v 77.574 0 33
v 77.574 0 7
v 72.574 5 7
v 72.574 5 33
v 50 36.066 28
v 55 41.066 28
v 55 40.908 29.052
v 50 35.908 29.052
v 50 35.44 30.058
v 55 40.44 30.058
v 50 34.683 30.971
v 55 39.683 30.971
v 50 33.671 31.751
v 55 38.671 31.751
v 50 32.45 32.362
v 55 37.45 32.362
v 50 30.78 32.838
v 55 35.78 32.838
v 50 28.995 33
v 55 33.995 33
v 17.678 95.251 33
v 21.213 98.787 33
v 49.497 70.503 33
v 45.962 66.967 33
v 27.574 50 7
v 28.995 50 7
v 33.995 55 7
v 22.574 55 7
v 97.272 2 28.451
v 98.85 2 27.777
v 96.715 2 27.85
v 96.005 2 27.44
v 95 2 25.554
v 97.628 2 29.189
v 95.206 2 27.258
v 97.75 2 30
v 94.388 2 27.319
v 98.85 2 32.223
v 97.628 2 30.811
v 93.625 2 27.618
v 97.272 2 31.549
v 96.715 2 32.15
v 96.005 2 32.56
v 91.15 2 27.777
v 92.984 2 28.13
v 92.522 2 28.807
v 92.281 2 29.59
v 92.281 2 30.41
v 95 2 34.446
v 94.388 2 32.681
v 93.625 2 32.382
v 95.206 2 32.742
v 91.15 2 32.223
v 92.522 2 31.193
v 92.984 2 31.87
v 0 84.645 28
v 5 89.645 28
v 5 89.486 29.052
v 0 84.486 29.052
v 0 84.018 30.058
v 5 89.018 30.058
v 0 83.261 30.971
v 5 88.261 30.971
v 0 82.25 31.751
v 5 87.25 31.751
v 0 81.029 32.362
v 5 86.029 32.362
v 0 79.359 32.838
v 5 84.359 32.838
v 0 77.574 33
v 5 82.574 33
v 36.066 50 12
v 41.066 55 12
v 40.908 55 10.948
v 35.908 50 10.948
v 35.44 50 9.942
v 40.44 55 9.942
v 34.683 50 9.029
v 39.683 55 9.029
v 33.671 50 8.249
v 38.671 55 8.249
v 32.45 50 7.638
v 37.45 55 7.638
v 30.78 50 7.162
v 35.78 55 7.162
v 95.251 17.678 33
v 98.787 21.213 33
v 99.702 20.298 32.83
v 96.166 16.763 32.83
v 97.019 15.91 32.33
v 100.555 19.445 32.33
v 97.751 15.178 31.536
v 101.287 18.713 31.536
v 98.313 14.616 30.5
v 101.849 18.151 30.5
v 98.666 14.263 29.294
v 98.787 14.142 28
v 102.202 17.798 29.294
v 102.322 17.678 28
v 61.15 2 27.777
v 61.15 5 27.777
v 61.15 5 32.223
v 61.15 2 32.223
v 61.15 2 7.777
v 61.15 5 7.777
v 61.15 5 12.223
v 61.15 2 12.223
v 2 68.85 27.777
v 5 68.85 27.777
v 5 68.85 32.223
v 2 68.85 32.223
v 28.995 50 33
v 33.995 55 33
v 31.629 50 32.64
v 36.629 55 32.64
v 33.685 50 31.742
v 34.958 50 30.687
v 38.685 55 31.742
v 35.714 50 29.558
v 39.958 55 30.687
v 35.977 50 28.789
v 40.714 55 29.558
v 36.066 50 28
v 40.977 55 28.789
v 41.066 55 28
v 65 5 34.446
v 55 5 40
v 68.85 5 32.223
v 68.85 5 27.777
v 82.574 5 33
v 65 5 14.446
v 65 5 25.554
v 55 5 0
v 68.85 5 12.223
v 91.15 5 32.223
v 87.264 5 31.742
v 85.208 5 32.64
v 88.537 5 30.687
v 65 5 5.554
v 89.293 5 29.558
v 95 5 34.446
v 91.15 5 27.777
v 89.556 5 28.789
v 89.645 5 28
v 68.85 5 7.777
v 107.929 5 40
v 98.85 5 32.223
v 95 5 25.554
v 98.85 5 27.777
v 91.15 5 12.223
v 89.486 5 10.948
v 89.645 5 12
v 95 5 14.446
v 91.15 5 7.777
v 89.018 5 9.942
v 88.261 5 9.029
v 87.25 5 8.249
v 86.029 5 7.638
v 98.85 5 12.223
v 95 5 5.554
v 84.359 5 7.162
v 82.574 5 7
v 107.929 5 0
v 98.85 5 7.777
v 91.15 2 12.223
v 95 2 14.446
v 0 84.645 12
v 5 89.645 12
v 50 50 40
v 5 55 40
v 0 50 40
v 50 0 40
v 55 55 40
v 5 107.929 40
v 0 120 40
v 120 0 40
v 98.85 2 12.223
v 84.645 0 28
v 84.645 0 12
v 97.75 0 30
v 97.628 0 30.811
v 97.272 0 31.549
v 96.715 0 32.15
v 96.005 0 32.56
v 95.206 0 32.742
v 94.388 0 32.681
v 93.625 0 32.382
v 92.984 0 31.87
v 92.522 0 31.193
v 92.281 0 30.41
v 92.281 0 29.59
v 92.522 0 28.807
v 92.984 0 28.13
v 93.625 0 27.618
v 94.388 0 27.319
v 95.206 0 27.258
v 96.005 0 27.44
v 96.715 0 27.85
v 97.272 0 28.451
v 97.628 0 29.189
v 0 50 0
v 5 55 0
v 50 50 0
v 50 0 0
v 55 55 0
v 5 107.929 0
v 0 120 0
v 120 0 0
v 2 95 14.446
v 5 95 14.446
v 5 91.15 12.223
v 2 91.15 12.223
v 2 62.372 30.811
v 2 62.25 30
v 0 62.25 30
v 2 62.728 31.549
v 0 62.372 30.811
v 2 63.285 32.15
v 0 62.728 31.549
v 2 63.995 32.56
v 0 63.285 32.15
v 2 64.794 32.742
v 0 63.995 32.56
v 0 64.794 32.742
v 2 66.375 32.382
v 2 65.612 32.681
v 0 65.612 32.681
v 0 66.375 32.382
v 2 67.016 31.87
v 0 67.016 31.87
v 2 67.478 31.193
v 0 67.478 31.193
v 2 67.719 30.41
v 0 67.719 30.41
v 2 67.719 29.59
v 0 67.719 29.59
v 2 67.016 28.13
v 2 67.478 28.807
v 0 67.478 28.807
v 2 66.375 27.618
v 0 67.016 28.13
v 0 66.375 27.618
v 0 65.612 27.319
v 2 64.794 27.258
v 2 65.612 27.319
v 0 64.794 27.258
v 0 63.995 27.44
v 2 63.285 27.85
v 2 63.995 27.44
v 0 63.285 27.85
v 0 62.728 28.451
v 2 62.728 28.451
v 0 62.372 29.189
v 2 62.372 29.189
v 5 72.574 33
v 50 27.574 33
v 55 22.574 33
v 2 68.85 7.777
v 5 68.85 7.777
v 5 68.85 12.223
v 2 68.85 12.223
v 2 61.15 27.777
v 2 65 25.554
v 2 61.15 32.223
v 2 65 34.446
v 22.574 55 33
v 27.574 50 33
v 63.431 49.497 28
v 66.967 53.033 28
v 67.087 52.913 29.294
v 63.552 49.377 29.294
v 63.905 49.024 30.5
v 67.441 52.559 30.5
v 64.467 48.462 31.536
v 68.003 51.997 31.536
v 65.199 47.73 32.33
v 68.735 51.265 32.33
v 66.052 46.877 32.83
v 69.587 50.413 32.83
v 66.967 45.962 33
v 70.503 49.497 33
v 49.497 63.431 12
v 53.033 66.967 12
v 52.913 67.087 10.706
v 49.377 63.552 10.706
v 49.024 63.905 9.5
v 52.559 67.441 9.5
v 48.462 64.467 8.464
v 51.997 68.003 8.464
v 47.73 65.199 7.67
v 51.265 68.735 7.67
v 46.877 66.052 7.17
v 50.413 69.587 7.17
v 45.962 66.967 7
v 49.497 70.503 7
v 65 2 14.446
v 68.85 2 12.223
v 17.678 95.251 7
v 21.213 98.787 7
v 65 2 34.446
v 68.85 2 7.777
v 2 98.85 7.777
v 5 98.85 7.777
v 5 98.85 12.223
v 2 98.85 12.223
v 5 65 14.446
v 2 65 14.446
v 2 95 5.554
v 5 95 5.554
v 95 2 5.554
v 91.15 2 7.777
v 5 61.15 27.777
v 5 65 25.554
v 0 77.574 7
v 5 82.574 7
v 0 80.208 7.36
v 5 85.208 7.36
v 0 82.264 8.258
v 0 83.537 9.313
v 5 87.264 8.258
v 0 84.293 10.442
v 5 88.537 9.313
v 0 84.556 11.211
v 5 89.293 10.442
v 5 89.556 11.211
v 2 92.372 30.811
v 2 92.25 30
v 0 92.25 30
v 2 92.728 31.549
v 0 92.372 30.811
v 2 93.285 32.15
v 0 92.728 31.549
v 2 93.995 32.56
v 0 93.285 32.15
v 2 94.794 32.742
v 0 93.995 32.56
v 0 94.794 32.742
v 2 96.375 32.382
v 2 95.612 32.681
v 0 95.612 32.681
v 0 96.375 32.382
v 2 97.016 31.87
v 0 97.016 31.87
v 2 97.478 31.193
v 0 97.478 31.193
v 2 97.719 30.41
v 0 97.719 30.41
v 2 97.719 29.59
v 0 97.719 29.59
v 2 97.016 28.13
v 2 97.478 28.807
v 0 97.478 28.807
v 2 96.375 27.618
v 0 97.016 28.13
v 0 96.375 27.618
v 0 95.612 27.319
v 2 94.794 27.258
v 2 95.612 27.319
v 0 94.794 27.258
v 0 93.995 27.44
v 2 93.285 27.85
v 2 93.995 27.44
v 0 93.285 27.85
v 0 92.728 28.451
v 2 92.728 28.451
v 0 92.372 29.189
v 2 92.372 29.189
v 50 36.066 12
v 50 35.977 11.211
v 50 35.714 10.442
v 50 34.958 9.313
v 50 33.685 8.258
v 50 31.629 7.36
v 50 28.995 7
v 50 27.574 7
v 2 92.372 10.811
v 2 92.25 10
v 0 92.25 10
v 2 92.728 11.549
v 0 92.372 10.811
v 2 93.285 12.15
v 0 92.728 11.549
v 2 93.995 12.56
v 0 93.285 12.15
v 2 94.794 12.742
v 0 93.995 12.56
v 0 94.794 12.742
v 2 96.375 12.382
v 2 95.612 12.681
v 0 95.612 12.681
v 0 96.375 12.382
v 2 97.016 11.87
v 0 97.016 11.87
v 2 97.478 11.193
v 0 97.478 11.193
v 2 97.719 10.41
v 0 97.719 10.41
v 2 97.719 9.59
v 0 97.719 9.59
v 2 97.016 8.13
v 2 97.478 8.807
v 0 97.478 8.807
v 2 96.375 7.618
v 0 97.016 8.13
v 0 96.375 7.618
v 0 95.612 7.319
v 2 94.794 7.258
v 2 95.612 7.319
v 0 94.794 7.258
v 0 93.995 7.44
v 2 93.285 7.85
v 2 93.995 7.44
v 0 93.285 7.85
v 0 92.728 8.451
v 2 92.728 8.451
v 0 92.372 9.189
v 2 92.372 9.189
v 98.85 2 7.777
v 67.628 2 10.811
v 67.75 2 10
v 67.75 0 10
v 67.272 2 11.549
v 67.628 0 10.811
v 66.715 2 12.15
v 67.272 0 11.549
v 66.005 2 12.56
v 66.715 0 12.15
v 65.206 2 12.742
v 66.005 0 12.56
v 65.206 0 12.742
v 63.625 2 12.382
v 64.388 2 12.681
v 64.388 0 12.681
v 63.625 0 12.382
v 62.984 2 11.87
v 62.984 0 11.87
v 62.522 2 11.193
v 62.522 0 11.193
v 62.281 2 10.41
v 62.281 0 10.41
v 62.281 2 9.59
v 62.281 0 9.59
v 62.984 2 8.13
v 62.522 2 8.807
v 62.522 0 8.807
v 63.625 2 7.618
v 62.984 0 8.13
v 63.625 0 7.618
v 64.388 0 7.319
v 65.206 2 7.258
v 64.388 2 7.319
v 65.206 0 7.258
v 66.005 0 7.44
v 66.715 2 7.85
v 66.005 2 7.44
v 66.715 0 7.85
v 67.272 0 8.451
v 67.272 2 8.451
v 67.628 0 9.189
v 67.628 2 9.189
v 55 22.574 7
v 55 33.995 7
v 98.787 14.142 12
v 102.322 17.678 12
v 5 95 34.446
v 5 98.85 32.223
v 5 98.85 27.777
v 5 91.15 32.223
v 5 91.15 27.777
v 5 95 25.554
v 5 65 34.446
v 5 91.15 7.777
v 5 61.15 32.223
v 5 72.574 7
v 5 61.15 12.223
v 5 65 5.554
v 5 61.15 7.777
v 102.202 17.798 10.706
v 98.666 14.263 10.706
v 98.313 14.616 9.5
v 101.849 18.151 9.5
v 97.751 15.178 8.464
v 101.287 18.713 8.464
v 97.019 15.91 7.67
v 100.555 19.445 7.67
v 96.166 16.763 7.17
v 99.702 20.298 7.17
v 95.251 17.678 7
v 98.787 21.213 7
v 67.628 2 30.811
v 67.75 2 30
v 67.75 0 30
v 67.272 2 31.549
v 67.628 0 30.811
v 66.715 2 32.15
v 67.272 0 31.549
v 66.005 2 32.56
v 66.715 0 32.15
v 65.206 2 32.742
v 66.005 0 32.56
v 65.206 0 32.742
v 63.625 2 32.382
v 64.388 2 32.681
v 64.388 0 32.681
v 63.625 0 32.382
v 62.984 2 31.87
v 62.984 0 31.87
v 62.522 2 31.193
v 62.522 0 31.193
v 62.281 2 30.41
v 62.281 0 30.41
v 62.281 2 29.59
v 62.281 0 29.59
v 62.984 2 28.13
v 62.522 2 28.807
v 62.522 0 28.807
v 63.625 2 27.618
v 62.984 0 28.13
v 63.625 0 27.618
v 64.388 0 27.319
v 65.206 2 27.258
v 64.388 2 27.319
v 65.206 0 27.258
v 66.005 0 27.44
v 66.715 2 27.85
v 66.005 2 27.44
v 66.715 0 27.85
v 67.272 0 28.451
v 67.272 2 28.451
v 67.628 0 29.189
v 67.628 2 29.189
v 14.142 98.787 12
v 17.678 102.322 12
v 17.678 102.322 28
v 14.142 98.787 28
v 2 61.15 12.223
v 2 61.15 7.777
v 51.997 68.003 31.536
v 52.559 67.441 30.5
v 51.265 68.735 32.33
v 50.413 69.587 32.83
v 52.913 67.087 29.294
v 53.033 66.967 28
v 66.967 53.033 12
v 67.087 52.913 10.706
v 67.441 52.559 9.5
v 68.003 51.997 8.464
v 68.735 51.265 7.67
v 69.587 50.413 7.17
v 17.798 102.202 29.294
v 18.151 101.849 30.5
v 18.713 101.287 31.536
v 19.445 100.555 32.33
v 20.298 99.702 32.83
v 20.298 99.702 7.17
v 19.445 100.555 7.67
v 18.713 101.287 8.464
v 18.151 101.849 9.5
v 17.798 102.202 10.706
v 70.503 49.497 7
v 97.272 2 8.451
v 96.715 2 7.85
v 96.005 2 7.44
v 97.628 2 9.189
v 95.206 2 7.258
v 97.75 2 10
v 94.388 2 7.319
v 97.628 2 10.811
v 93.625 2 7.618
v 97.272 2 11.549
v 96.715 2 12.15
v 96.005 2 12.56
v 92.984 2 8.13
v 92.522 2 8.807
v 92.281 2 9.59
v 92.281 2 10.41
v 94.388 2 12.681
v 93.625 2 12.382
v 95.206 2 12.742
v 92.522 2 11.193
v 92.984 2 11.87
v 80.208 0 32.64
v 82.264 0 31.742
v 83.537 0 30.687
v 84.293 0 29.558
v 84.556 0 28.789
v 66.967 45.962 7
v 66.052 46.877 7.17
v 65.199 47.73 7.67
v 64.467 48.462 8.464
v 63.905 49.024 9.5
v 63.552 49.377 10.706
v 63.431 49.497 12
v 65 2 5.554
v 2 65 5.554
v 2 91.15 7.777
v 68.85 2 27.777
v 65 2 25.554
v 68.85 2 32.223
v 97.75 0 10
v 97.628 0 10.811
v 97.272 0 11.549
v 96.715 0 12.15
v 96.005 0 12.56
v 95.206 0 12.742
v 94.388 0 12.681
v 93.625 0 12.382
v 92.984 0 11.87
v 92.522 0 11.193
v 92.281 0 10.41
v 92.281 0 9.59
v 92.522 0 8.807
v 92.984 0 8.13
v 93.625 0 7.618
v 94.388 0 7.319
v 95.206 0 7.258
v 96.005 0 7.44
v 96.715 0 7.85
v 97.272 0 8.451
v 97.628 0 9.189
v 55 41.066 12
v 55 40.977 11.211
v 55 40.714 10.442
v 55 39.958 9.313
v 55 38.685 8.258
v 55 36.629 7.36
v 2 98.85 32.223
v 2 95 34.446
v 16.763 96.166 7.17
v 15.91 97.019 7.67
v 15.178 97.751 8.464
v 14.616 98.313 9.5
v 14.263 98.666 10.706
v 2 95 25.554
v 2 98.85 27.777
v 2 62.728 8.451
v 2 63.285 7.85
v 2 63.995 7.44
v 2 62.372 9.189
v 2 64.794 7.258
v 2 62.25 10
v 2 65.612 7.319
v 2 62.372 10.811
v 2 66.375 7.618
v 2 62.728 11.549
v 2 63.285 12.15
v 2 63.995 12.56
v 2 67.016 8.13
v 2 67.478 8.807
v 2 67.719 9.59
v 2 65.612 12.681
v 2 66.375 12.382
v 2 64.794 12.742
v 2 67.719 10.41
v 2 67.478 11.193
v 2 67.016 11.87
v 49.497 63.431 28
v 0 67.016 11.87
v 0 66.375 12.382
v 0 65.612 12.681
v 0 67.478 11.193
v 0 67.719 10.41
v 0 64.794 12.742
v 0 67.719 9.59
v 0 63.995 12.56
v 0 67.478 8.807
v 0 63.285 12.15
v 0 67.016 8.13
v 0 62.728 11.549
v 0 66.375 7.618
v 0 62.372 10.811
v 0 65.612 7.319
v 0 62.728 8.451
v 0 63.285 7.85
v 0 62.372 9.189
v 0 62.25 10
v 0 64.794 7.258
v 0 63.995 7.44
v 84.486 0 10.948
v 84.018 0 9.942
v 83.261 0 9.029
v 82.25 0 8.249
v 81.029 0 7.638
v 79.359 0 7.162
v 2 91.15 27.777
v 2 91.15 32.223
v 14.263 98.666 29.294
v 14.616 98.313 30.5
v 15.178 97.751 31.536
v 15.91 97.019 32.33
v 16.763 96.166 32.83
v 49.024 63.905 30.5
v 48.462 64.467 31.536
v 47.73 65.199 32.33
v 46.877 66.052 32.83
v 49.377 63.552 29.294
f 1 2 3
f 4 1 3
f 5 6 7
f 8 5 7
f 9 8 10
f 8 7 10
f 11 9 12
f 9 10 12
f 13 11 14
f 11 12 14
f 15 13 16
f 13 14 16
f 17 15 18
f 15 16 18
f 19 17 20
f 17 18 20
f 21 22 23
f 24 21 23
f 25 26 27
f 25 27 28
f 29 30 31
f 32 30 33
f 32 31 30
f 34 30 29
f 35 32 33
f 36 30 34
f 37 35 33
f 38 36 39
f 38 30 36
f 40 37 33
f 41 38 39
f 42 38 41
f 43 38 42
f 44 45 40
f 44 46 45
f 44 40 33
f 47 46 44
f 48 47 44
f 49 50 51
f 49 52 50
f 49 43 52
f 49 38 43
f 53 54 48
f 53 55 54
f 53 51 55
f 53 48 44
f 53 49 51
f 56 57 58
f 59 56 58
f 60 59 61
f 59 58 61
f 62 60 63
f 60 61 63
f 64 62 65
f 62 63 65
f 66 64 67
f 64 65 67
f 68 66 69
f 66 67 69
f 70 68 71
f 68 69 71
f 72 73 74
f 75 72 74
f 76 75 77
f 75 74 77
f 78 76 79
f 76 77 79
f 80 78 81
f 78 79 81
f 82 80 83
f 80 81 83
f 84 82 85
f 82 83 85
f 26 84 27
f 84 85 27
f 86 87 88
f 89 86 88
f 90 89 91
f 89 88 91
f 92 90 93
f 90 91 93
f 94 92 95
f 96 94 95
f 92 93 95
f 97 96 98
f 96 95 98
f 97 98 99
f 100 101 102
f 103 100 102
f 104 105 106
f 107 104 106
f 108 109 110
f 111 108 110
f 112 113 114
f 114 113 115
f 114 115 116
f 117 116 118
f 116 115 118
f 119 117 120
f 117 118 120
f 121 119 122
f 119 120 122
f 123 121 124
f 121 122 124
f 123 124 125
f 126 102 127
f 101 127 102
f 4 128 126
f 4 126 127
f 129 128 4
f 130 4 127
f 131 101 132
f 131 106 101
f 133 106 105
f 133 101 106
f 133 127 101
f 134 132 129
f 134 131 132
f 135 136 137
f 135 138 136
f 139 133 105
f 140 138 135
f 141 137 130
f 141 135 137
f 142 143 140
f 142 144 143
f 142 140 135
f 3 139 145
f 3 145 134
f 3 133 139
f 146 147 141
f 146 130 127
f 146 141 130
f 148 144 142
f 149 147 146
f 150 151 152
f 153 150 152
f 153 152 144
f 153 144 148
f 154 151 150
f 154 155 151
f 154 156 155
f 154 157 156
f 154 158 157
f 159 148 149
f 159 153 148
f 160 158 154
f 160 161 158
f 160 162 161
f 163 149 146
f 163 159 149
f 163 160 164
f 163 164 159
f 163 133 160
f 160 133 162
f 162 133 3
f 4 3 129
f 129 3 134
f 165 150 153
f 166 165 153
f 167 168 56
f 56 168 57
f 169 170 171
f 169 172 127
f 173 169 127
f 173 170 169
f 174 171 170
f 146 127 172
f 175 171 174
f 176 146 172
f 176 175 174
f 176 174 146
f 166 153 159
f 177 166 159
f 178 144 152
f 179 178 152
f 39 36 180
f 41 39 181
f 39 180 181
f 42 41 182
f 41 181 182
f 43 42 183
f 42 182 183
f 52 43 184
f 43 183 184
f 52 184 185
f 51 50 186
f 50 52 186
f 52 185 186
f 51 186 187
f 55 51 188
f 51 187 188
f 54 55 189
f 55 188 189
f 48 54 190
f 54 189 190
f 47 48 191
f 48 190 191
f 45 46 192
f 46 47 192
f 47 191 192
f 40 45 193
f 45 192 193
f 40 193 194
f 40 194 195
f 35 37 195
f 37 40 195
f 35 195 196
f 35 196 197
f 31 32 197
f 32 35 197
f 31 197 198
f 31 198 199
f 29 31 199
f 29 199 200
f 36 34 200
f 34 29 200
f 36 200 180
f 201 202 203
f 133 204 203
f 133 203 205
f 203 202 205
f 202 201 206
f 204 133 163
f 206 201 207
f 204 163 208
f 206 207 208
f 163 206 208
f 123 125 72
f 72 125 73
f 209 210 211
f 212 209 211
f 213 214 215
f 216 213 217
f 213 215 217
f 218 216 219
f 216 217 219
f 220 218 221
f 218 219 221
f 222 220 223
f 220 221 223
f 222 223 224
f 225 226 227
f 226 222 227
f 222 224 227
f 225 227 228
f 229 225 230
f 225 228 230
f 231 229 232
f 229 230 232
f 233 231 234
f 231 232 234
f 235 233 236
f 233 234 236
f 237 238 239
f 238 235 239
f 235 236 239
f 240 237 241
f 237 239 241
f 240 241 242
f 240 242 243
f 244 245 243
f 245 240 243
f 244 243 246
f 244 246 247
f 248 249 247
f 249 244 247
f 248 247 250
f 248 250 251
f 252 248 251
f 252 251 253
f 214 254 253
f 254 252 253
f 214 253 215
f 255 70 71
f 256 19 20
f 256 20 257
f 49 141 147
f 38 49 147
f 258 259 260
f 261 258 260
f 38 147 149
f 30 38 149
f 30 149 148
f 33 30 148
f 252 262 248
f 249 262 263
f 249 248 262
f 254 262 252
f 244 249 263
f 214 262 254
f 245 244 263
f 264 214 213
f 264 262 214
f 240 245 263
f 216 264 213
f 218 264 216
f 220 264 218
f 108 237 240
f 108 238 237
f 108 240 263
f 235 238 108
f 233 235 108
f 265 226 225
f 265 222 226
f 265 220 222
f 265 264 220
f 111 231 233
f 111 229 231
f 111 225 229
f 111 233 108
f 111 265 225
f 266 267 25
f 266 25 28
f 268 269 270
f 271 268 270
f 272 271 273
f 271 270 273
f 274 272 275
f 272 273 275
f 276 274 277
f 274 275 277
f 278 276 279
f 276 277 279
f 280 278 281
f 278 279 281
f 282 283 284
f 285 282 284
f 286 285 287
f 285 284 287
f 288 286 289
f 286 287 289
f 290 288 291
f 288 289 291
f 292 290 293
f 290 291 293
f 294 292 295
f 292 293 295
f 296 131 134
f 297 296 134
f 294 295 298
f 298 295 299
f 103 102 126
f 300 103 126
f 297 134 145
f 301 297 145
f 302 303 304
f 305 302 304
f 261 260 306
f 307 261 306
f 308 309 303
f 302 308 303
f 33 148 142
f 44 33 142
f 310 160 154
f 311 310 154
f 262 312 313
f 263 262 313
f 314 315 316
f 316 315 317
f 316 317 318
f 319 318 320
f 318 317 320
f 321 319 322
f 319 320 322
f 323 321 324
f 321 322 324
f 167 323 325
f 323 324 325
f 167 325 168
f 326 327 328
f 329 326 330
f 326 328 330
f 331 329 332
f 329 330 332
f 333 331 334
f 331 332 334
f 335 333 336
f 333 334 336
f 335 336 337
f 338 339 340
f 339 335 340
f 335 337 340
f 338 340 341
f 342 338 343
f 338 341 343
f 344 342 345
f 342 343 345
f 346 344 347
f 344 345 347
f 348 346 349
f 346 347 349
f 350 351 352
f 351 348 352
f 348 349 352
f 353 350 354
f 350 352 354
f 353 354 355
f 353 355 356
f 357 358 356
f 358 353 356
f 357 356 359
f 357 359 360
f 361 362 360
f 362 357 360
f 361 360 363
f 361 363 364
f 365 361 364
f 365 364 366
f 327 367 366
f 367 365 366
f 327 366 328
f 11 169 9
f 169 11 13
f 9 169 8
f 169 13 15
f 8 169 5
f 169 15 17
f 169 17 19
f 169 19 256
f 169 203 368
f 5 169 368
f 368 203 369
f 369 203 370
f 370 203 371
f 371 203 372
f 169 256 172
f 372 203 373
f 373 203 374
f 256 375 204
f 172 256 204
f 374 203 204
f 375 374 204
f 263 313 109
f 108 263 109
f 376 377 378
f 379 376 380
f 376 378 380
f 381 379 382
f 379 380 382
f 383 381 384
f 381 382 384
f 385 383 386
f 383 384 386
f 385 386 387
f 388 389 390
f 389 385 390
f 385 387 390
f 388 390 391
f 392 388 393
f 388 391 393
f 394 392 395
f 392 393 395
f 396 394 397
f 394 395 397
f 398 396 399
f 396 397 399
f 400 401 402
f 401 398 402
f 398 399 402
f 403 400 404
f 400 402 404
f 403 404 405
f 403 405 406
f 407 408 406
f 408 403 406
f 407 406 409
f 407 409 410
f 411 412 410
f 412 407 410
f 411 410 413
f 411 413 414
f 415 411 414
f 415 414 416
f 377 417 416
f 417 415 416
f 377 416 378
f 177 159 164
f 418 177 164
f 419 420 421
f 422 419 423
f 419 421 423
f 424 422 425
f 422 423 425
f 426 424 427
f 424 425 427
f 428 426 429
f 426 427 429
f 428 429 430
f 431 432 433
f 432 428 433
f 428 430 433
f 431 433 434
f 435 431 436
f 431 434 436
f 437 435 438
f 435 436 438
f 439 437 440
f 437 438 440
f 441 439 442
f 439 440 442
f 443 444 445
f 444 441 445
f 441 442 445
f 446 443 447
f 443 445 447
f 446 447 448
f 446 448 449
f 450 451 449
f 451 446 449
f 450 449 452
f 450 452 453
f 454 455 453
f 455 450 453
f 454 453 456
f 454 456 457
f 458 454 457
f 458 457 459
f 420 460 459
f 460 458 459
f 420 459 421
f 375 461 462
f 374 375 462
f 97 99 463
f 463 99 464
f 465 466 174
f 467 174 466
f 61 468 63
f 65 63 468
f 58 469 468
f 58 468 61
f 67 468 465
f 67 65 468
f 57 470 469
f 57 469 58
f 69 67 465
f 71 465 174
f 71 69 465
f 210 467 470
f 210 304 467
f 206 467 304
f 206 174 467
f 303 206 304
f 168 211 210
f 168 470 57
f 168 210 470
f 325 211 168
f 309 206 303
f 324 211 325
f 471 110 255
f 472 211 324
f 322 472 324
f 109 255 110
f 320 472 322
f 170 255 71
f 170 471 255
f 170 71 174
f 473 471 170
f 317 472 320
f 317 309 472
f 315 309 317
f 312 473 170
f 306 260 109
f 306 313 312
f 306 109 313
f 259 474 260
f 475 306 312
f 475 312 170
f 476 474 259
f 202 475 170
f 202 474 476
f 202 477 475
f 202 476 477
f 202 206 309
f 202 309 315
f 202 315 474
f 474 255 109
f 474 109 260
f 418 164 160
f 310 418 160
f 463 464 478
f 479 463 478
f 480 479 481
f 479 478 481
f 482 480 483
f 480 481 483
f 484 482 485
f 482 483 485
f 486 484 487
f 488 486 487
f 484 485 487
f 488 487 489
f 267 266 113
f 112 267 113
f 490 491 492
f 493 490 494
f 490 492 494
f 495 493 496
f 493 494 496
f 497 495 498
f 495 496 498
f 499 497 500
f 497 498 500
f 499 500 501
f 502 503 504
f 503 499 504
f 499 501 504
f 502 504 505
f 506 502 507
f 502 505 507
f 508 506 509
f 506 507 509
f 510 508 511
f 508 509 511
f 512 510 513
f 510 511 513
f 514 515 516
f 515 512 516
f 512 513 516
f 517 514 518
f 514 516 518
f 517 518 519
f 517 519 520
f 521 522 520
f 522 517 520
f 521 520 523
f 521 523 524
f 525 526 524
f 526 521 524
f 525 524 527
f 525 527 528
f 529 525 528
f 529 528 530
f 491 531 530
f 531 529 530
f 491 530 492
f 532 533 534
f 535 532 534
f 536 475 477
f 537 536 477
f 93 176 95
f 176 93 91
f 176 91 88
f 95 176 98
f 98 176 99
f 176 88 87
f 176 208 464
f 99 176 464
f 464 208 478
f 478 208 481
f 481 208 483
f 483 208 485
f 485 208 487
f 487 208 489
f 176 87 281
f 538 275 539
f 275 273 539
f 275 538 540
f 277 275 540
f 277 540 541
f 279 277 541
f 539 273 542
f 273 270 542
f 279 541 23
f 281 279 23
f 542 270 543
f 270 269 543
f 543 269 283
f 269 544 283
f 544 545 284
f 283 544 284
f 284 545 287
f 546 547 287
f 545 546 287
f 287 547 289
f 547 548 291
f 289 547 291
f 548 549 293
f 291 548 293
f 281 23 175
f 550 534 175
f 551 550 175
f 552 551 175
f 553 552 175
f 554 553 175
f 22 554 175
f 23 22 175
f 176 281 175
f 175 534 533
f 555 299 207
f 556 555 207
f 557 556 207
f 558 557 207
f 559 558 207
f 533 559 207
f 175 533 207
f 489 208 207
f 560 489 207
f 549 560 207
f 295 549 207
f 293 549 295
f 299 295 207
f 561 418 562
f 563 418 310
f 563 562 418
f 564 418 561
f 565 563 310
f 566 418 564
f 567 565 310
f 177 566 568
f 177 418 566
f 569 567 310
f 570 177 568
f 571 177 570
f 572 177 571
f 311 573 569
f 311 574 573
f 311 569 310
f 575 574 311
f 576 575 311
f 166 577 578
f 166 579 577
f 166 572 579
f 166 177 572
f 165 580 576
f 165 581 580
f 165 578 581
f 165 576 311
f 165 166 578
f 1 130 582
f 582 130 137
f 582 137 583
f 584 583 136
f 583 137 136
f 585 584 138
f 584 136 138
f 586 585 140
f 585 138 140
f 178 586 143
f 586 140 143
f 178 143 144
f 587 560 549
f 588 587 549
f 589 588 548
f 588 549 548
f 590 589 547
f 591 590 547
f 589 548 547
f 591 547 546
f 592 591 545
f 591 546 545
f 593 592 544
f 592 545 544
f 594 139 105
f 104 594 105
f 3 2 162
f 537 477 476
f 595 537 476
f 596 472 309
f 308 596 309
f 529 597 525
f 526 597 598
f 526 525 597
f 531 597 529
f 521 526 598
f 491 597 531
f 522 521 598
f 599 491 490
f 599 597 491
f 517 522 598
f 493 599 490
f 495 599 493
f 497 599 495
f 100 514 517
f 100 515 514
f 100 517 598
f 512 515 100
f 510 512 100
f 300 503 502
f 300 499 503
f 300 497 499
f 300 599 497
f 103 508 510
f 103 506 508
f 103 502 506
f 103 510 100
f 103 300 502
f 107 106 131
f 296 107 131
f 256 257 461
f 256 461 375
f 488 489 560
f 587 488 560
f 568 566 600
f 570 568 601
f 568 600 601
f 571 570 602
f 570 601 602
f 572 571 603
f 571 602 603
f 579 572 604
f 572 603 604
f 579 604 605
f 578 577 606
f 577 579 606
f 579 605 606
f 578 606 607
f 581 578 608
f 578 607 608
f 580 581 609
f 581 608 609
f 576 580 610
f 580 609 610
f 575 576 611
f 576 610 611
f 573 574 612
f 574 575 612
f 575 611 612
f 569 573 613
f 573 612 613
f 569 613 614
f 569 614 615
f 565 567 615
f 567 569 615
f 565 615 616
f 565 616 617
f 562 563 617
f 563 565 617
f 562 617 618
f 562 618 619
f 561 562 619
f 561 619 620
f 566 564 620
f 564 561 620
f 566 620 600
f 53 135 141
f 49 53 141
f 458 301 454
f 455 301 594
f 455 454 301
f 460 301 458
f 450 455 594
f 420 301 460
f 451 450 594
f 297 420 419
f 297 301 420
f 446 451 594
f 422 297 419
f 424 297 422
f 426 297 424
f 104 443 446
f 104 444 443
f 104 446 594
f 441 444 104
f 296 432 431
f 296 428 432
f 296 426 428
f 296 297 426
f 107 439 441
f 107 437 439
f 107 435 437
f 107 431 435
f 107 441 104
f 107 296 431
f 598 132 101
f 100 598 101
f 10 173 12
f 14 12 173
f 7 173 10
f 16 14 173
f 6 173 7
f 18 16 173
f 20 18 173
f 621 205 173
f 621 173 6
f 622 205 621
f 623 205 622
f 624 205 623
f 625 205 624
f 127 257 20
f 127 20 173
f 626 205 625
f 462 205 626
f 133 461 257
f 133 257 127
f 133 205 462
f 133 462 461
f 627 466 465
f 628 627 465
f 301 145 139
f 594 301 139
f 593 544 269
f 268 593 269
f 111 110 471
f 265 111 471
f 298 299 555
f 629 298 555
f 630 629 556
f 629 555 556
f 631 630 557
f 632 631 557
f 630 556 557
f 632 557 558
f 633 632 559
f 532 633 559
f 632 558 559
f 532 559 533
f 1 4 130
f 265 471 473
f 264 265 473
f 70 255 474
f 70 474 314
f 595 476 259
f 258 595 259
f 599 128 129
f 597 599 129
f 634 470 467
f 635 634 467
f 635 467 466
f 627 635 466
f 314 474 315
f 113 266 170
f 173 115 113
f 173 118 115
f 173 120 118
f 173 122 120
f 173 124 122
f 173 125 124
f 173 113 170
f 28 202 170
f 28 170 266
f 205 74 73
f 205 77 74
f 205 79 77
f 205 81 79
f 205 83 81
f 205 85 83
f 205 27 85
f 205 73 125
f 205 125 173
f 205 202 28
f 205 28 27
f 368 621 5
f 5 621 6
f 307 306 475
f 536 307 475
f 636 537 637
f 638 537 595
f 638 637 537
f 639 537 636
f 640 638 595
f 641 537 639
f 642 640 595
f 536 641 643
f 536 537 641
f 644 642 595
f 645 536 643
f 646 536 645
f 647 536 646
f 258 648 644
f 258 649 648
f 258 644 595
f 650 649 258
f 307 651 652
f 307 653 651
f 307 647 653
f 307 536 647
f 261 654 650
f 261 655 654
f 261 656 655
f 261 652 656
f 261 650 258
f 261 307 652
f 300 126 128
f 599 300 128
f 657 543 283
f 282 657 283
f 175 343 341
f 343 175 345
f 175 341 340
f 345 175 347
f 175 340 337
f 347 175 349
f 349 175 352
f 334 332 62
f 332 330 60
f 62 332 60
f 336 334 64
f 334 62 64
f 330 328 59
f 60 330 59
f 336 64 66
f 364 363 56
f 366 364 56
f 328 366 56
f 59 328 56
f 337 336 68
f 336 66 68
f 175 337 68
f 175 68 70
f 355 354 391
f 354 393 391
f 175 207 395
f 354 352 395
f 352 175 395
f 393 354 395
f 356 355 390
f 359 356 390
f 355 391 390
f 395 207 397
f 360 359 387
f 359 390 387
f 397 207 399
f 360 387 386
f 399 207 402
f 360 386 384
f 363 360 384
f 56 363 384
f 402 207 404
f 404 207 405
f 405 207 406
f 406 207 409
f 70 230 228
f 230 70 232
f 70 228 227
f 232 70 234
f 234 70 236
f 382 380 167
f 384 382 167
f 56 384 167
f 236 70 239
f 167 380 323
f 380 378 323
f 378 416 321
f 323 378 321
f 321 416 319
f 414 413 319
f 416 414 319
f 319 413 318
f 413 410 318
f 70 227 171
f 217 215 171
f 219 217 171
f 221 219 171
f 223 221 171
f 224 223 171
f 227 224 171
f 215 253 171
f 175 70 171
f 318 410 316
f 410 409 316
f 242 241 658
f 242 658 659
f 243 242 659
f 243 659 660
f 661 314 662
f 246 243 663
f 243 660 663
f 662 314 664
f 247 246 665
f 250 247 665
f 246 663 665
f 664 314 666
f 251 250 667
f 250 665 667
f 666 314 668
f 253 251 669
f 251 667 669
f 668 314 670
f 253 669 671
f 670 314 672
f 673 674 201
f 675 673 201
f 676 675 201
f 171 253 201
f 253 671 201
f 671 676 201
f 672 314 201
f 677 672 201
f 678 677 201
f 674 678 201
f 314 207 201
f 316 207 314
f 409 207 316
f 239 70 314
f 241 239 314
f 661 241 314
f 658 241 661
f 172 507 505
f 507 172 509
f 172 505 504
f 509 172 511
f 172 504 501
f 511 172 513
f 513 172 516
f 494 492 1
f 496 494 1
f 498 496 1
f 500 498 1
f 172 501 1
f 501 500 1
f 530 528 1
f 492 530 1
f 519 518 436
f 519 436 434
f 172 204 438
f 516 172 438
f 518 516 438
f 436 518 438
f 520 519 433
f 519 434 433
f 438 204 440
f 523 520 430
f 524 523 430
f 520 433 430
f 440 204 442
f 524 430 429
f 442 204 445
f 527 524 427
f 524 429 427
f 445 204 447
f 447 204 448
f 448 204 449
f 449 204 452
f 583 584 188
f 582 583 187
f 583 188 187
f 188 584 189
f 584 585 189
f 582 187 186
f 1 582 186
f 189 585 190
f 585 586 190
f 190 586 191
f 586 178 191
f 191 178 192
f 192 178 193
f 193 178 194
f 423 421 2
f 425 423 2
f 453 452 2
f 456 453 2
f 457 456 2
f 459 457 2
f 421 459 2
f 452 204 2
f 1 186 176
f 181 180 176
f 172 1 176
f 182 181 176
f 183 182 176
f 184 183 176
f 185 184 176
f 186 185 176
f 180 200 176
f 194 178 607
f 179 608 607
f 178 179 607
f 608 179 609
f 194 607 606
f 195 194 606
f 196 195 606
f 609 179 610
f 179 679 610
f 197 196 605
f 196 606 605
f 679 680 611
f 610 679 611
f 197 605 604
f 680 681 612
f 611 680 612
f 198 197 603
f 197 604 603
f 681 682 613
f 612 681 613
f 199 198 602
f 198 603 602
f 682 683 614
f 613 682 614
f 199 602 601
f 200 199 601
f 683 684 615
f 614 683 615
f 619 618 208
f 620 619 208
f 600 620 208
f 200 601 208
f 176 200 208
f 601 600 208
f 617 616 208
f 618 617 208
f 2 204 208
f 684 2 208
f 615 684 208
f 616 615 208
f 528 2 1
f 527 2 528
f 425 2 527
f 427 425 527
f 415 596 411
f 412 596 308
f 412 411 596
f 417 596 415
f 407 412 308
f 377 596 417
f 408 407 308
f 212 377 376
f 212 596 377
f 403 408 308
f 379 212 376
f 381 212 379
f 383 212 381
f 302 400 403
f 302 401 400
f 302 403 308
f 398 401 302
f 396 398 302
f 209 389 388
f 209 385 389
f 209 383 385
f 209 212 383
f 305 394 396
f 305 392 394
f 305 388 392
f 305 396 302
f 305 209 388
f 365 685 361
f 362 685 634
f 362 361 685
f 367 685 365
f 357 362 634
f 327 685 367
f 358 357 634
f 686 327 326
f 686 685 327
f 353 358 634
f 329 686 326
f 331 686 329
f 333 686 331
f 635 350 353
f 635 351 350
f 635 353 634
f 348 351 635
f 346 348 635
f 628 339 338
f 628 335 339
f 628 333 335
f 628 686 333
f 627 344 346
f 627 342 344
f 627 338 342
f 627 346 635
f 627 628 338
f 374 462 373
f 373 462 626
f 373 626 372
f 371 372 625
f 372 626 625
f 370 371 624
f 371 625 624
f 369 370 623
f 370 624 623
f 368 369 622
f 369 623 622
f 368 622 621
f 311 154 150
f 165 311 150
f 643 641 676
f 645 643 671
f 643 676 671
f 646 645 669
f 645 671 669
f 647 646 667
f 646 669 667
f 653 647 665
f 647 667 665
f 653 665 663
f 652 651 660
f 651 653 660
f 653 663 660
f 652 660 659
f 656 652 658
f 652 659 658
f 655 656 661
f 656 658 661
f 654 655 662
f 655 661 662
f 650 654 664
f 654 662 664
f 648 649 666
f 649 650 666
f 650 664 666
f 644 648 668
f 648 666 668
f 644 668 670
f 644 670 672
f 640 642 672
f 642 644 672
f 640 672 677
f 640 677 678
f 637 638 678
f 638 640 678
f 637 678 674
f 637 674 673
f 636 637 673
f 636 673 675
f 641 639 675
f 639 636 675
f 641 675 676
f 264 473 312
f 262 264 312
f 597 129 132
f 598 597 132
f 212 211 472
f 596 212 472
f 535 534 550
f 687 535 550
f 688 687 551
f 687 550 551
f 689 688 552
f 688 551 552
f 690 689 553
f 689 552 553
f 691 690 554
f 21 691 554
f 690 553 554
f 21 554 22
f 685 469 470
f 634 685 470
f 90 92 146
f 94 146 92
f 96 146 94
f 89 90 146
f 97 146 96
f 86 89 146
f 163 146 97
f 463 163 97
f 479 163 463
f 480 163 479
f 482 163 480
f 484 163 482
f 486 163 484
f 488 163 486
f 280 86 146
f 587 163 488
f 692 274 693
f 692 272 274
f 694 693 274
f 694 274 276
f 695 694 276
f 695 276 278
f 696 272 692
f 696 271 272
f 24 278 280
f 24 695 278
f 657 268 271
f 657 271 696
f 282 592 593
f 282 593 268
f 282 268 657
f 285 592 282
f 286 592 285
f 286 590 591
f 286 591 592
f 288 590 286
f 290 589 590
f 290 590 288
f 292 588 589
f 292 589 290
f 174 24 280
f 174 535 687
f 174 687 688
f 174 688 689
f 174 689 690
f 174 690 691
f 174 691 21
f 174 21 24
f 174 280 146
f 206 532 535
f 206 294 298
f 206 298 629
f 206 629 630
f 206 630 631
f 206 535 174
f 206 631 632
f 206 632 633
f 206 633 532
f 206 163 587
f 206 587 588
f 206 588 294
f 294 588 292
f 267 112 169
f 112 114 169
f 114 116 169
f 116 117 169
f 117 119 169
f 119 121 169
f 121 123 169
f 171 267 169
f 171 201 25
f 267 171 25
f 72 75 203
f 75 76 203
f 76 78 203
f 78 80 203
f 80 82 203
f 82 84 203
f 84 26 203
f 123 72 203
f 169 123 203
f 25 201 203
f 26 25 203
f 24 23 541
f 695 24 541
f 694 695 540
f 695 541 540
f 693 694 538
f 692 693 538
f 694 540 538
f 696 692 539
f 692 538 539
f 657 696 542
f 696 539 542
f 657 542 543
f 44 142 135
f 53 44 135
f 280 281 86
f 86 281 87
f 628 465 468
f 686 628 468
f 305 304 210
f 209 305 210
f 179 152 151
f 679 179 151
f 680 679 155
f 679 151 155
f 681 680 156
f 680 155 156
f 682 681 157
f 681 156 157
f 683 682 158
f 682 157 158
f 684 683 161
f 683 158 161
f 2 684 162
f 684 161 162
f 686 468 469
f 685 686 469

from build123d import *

# Parameters (mm, degrees)
F1_DEPTH  = 40
F2_T      = -5
F4_DEPTH  = 30
F5_R      = 2.75
F6_DEPTH  = 5
F7_R      = 2.75
F8_DEPTH  = 5
F9_R      = 2.75
F10_DEPTH = 3
F11_R     = 2.75
F12_DEPTH = 3


# Not quite as in the source:
# - a feature names something its author has since deleted; it is built from what else it names


with BuildPart() as f1:
    # F0 (on Top) → F1 (new body)
    with BuildSketch(Plane.XY):
        Polygon((120, 0), (0, 120), (0, 100), (50, 50), (100, 0), align=None)
        Polygon((50, 50), (0, 100), (0, 92.9289321881), (42.9289321881, 50), align=None)
        Polygon((42.9289321881, 50), (0, 92.9289321881), (0, 50), align=None)
        Polygon((92.9289321881, 0), (50, 42.9289321881), (50, 0), align=None)
        Polygon((100, 0), (50, 50), (50, 42.9289321881), (92.9289321881, 0), align=None)
    extrude(amount=F1_DEPTH)

    # F2
    f2_openings = [f1.faces().sort_by_distance(p)[0] for p in [
        (51.697056, 25, 40),
        (51.697056, 25, 0),
    ]]
    offset(amount=F2_T, openings=f2_openings, kind=Kind.INTERSECTION)

    # F3 (on face) → F4 (cut)
    with BuildSketch(Plane(origin=(60, 60, 0), x_dir=(-0.7071067812, 0.7071067812, 0), z_dir=(0.7071067812, 0.7071067812, 0))):
        with BuildLine():
            ThreePointArc((59.8528137424, 28), (58.3883476483, 31.5355339059), (54.8528137424, 33))
            Line((54.8528137424, 33), (14.8528137424, 33))
            ThreePointArc((14.8528137424, 33), (11.3172798365, 31.5355339059), (9.8528137424, 28))
            Line((9.8528137424, 28), (9.8528137424, 12))
            ThreePointArc((9.8528137424, 12), (11.3172798365, 8.4644660941), (14.8528137424, 7))
            Line((14.8528137424, 7), (54.8528137424, 7))
            ThreePointArc((54.8528137424, 7), (58.3883476483, 8.4644660941), (59.8528137424, 12))
            Line((59.8528137424, 12), (59.8528137424, 28))
        make_face()
        with BuildLine():
            ThreePointArc((-54.8528137424, 33), (-58.3883476483, 31.5355339059), (-59.8528137424, 28))
            Line((-59.8528137424, 28), (-59.8528137424, 12))
            ThreePointArc((-59.8528137424, 12), (-58.3883476483, 8.4644660941), (-54.8528137424, 7))
            Line((-54.8528137424, 7), (-14.8528137424, 7))
            ThreePointArc((-14.8528137424, 7), (-11.3172798365, 8.4644660941), (-9.8528137424, 12))
            Line((-9.8528137424, 12), (-9.8528137424, 28))
            ThreePointArc((-9.8528137424, 28), (-11.3172798365, 31.5355339059), (-14.8528137424, 33))
            Line((-14.8528137424, 33), (-54.8528137424, 33))
        make_face()
    extrude(amount=-F4_DEPTH, mode=Mode.SUBTRACT)

    # F5 (on face) → F6 (cut, through all)
    with BuildSketch(Plane(origin=(0, 0, 0), x_dir=(0, -1, 0), z_dir=(-1, 0, 0))):
        with Locations((-95, 10)):
            Circle(F5_R)
        with Locations((-95, 30)):
            Circle(F5_R)
        with Locations((-65, 10)):
            Circle(F5_R)
        with Locations((-65, 30)):
            Circle(F5_R)
    extrude(amount=-F6_DEPTH, mode=Mode.SUBTRACT)

    # F7 (on face) → F8 (cut, through all)
    with BuildSketch(Plane.XZ):
        with Locations((65, 30)):
            Circle(F7_R)
        with Locations((95, 30)):
            Circle(F7_R)
        with Locations((95, 10)):
            Circle(F7_R)
        with Locations((65, 10)):
            Circle(F7_R)
    extrude(amount=-F8_DEPTH, mode=Mode.SUBTRACT)

    # F9 (on face) → F10 (cut)
    with BuildSketch(Plane.YZ.offset(5)):
        Polygon((61.15, 27.7772014636), (65, 25.5544029272), (68.85, 27.7772014636), (68.85, 32.2227985364), (65, 34.4455970728), (61.15, 32.2227985364), align=None)
        with Locations((65, 30)):
            Circle(F9_R, mode=Mode.SUBTRACT)
        Polygon((61.15, 12.2227985364), (61.15, 7.7772014636), (65, 5.5544029272), (68.85, 7.7772014636), (68.85, 12.2227985364), (65, 14.4455970728), align=None)
        with Locations((65, 10)):
            Circle(F9_R, mode=Mode.SUBTRACT)
        Polygon((91.15, 7.7772014636), (95, 5.5544029272), (98.85, 7.7772014636), (98.85, 12.2227985364), (95, 14.4455970728), (91.15, 12.2227985364), align=None)
        with Locations((95, 10)):
            Circle(F9_R, mode=Mode.SUBTRACT)
        Polygon((91.15, 27.7772014636), (95, 25.5544029272), (98.85, 27.7772014636), (98.85, 32.2227985364), (95, 34.4455970728), (91.15, 32.2227985364), align=None)
        with Locations((95, 30)):
            Circle(F9_R, mode=Mode.SUBTRACT)
    extrude(amount=-F10_DEPTH, mode=Mode.SUBTRACT)

    # F11 (on face) → F12 (cut)
    with BuildSketch(Plane(origin=(0, 5, 0), x_dir=(-1, 0, 0), z_dir=(0, 1, 0))):
        Polygon((-91.15, 12.2227985364), (-95, 14.4455970728), (-98.85, 12.2227985364), (-98.85, 7.7772014636), (-95, 5.5544029272), (-91.15, 7.7772014636), align=None)
        with Locations((-95, 10)):
            Circle(F11_R, mode=Mode.SUBTRACT)
        Polygon((-91.15, 32.2227985364), (-95, 34.4455970728), (-98.85, 32.2227985364), (-98.85, 27.7772014636), (-95, 25.5544029272), (-91.15, 27.7772014636), align=None)
        with Locations((-95, 30)):
            Circle(F11_R, mode=Mode.SUBTRACT)
        Polygon((-61.15, 32.2227985364), (-65, 34.4455970728), (-68.85, 32.2227985364), (-68.85, 27.7772014636), (-65, 25.5544029272), (-61.15, 27.7772014636), align=None)
        with Locations((-65, 30)):
            Circle(F11_R, mode=Mode.SUBTRACT)
        Polygon((-61.15, 12.2227985364), (-65, 14.4455970728), (-68.85, 12.2227985364), (-68.85, 7.7772014636), (-65, 5.5544029272), (-61.15, 7.7772014636), align=None)
        with Locations((-65, 10)):
            Circle(F11_R, mode=Mode.SUBTRACT)
    extrude(amount=-F12_DEPTH, mode=Mode.SUBTRACT)


solid = f1.part
